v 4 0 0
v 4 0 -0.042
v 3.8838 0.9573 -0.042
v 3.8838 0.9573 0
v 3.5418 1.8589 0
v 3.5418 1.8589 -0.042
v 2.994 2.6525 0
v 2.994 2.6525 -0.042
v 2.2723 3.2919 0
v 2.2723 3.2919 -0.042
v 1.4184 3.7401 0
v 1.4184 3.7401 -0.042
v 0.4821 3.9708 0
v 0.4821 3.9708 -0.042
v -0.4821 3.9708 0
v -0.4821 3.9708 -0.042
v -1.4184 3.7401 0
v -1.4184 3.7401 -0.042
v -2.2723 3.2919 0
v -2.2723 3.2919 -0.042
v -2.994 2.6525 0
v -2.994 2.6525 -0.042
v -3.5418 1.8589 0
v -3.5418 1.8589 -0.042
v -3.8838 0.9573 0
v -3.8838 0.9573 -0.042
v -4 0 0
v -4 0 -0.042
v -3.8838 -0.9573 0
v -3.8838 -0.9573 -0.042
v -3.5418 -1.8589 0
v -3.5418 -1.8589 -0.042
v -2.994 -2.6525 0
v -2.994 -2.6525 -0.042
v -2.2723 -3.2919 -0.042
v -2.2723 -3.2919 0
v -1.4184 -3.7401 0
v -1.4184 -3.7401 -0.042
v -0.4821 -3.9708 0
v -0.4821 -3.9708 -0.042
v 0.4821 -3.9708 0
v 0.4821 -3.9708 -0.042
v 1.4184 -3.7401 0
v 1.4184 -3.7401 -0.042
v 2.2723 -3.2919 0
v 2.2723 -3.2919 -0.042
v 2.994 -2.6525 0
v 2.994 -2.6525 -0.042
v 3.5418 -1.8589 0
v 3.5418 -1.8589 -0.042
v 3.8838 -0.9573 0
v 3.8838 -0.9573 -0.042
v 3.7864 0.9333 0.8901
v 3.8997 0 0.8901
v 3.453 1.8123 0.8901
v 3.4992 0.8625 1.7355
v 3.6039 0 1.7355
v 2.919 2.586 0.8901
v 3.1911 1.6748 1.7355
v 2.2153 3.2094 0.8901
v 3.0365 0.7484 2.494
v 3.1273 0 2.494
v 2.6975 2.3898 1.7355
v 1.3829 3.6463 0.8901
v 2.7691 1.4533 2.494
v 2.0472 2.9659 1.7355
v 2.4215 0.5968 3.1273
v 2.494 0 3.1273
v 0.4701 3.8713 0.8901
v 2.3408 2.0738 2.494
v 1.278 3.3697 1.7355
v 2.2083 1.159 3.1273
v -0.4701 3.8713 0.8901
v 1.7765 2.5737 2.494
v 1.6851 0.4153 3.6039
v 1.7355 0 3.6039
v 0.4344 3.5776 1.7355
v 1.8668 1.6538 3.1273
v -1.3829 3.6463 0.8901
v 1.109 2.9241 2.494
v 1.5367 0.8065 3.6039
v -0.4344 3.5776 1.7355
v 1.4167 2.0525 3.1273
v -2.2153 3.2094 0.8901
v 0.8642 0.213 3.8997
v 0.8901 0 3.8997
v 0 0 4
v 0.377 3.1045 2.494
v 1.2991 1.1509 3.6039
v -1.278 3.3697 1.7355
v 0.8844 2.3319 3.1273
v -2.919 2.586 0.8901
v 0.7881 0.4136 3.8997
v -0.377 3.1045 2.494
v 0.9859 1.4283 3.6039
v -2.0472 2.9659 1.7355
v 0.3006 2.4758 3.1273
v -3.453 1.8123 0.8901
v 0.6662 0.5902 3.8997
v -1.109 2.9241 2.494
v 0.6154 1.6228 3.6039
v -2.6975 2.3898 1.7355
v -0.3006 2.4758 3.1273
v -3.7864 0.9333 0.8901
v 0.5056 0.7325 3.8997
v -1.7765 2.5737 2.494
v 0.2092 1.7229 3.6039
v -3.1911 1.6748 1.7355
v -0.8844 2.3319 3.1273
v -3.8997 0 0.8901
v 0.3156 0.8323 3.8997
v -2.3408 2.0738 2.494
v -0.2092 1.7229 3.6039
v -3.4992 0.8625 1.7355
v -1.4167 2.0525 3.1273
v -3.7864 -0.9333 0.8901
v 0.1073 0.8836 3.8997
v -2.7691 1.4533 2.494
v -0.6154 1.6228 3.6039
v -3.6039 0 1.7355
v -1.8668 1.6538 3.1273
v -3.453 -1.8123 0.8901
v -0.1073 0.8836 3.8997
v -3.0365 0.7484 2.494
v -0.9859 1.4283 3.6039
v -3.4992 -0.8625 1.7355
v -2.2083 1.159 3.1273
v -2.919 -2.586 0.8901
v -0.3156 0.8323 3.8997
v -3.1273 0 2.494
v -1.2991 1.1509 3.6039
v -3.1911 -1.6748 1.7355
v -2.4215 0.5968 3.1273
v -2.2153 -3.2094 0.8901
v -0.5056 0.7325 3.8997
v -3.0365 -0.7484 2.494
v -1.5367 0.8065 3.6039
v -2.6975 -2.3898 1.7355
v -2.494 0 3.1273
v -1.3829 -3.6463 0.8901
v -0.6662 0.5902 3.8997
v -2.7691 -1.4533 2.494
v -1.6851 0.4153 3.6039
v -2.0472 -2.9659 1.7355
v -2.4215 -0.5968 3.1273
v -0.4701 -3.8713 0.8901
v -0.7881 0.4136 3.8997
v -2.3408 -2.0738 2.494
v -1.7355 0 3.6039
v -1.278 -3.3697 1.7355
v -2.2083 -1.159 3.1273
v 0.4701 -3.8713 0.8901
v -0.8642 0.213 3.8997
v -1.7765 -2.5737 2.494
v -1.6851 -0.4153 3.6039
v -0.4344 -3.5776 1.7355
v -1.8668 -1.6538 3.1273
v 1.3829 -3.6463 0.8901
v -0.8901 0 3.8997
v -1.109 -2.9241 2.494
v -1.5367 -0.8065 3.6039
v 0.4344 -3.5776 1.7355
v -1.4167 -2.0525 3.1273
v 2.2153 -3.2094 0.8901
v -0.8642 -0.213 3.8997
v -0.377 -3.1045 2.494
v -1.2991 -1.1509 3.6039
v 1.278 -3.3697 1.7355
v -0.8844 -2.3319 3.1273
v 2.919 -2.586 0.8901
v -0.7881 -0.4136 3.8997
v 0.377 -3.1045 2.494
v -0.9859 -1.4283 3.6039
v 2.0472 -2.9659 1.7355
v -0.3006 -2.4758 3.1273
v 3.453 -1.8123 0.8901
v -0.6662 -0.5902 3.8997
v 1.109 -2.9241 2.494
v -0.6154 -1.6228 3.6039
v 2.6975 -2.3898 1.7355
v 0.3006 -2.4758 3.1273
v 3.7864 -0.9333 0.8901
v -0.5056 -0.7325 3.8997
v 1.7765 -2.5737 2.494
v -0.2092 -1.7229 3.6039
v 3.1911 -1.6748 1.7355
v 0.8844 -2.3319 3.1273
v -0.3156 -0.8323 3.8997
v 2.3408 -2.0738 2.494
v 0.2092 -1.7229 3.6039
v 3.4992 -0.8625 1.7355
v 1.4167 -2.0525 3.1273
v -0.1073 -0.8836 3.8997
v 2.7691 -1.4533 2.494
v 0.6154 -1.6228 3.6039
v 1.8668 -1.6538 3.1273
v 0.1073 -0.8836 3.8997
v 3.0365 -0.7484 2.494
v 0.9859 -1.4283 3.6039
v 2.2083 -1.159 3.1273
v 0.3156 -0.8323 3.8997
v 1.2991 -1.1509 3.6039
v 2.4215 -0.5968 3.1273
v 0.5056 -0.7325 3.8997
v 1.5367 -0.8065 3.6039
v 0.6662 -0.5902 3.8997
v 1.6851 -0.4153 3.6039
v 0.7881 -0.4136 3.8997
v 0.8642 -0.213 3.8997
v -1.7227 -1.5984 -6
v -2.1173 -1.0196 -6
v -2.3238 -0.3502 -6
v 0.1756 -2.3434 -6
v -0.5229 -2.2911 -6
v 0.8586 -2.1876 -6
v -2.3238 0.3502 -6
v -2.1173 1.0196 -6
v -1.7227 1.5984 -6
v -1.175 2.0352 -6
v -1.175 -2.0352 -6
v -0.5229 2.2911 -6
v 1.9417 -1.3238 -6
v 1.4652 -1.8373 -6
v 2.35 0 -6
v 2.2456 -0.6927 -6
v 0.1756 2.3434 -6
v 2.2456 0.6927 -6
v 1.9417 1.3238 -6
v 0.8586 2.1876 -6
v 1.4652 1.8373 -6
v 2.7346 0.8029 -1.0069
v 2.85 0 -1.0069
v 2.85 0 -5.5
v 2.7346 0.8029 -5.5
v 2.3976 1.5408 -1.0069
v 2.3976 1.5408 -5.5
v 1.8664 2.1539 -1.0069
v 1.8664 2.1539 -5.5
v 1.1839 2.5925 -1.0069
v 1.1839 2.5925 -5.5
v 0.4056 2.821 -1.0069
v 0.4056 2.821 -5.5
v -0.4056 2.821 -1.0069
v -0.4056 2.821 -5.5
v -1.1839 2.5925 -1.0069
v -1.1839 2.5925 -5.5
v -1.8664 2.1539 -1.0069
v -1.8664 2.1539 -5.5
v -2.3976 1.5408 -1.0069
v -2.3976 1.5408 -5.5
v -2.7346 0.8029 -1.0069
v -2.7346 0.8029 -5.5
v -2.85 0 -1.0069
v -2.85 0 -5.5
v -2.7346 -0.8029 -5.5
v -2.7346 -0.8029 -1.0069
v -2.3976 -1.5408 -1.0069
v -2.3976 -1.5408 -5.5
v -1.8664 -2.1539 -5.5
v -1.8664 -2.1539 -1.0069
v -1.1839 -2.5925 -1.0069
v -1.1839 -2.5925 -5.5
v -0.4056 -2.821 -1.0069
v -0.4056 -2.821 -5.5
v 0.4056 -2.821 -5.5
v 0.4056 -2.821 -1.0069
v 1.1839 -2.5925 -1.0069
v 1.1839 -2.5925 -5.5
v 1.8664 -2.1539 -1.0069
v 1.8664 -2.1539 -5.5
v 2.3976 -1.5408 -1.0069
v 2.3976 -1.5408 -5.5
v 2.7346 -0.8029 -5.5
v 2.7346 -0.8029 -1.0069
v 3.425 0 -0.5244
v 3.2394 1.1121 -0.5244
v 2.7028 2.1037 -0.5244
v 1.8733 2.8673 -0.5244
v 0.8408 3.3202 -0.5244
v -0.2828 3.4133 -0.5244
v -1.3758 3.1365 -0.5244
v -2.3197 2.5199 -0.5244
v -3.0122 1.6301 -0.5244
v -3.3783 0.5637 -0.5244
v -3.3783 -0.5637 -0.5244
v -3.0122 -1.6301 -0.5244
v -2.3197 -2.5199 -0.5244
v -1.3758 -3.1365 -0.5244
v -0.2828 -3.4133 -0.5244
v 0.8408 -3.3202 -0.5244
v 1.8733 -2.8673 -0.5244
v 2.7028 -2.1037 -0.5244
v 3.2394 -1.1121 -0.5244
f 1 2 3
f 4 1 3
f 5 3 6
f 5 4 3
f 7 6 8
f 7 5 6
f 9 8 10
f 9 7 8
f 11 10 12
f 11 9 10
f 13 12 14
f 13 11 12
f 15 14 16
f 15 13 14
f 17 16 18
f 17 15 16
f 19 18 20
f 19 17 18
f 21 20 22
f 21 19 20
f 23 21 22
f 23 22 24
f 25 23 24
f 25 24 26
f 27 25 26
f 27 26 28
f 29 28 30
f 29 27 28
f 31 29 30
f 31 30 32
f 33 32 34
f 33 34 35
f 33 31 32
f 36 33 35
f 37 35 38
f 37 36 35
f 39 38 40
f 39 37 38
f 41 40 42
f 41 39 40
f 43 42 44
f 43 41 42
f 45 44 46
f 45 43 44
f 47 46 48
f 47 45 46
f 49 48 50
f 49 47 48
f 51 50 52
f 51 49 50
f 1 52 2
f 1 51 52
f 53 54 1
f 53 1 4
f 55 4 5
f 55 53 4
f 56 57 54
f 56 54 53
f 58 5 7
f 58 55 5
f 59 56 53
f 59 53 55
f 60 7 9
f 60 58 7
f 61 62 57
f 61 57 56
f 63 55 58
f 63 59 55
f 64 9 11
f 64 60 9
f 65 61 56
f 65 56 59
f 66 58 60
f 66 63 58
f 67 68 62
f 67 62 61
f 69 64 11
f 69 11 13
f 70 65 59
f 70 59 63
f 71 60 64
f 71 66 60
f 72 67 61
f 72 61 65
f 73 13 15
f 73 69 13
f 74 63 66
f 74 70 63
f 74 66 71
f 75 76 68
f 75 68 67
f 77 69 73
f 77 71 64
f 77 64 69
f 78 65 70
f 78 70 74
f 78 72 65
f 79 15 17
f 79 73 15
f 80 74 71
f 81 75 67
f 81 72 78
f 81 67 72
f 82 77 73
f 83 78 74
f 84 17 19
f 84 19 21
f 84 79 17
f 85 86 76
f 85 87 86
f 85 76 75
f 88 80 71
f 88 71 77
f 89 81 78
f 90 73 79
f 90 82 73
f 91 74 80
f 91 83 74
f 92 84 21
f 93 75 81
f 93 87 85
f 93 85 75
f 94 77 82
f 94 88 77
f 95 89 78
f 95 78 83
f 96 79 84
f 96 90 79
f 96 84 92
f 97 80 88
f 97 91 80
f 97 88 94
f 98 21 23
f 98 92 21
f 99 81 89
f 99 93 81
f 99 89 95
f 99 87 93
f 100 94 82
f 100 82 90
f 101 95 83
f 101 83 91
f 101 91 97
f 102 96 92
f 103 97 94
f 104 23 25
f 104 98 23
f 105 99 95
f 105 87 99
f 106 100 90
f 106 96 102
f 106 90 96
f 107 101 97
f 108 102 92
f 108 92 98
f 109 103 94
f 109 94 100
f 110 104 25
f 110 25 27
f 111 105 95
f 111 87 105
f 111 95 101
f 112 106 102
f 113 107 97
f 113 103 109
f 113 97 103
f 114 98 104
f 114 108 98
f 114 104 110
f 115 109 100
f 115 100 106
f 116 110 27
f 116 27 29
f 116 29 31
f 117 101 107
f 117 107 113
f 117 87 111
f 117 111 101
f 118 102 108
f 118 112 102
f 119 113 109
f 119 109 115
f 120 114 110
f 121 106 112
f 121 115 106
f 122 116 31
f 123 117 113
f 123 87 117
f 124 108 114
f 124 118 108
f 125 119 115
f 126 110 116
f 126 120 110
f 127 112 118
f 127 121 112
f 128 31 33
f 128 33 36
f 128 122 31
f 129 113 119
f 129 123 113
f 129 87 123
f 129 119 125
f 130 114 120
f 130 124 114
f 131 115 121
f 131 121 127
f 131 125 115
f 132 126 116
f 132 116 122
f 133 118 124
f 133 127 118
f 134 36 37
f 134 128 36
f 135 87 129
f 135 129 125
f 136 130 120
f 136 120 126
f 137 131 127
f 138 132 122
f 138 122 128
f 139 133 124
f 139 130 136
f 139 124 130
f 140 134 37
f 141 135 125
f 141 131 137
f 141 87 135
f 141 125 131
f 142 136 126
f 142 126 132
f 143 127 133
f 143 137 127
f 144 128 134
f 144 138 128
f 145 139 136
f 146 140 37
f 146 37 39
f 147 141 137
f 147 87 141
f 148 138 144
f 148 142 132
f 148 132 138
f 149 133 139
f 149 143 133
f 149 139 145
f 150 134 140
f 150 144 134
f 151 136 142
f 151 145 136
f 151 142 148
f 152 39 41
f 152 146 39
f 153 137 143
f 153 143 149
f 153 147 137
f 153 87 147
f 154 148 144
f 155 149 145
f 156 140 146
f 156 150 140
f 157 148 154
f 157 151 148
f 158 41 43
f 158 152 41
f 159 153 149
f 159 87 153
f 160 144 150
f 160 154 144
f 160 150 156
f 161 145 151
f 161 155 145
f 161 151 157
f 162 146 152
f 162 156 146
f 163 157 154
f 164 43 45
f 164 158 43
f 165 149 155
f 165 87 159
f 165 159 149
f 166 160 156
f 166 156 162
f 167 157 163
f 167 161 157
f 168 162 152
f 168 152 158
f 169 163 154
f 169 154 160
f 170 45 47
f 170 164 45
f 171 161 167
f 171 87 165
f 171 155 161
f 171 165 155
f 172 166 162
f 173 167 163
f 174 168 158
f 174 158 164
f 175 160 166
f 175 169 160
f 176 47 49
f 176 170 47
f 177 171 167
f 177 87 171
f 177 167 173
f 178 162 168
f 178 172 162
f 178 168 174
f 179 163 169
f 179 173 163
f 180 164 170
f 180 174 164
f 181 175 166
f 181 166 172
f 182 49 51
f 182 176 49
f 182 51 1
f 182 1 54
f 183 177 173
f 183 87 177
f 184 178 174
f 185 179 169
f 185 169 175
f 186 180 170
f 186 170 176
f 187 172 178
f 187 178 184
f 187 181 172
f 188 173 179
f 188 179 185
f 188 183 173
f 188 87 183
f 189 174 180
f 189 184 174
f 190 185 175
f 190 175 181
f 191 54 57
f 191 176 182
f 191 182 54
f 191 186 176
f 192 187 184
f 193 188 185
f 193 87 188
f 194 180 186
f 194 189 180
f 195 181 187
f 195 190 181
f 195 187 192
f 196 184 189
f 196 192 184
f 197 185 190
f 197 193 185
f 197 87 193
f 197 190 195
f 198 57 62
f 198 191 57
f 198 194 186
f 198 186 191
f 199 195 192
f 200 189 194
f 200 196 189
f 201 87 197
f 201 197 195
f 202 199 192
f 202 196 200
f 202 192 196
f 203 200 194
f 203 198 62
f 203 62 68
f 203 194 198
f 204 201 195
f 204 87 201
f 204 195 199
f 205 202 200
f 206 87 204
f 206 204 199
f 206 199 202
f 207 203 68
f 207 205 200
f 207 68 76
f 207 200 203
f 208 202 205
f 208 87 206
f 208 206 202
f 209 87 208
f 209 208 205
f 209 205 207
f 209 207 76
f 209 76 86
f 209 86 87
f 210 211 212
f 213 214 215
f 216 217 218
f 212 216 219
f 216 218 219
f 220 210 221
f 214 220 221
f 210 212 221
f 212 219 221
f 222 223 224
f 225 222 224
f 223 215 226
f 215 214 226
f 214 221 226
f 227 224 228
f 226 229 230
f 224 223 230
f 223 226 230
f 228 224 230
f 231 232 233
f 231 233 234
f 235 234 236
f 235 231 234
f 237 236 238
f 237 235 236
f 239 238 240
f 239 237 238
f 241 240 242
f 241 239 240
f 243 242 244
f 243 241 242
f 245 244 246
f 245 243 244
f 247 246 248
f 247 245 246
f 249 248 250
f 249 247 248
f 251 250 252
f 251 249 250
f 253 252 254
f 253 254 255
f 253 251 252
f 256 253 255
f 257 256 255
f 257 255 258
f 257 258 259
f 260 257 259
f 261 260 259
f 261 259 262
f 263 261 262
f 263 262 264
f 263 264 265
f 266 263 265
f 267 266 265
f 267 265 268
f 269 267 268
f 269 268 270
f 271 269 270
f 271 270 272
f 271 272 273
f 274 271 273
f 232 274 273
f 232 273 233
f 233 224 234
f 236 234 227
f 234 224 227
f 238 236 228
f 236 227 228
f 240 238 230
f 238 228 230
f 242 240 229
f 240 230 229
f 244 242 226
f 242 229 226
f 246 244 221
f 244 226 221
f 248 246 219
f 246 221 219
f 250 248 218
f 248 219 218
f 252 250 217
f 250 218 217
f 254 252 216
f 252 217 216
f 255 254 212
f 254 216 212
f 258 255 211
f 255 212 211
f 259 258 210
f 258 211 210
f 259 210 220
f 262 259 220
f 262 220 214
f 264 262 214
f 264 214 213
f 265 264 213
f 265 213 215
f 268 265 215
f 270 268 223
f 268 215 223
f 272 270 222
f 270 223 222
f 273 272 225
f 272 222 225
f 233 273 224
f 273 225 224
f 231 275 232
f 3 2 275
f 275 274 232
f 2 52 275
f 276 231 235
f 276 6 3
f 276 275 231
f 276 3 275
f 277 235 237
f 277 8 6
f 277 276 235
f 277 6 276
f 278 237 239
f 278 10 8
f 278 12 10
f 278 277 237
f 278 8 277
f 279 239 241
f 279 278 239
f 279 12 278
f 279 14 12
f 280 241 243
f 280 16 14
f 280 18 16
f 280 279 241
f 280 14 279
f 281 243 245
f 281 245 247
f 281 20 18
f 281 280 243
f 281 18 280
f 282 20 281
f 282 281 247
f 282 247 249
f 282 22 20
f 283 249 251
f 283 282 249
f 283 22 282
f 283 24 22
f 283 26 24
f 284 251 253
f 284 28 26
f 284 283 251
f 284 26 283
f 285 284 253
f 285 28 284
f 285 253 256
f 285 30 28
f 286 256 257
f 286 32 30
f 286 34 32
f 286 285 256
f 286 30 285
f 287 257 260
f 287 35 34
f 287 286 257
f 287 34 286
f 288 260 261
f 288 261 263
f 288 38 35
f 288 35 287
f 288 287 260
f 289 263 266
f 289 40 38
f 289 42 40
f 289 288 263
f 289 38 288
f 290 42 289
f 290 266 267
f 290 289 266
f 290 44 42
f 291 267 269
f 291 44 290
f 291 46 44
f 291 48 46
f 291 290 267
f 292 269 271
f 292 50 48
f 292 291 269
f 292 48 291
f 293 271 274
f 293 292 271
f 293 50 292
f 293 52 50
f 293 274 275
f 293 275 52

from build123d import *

# Parameters (mm, degrees)
F0_R        = 4
F0_R_2      = 2.85
F1_DEPTH    = 4
F2_DEPTH    = 6
F3_R        = 3.99999
F4_SIZE     = 0.5
F5_S5_R     = 4
F5_T6_DEPTH = 7


# Not quite as in the source:
# - a fillet or chamfer that OpenCascade refuses, or shapes differently, is made with other operations: its cross-section is extruded or revolved along the edge and cut away or added
# - a fillet or chamfer is up to 0.001 mm smaller than in the source, because OpenCascade refuses the exact size


with BuildPart() as f1:
    # F0 (on Top) → F1 (new body)
    with BuildSketch(Plane.XY):
        Circle(F0_R)
        Circle(F0_R_2, mode=Mode.SUBTRACT)
        Circle(F0_R_2)
    extrude(amount=F1_DEPTH)

    # F0 (on Top) → F2 (join)
    with BuildSketch(Plane.XY):
        Circle(F0_R_2)
    extrude(amount=-F2_DEPTH)

    # F3 (radius 4 in the source; OpenCascade refuses exactly that, so slightly less here)
    f3_edges = [f1.edges().sort_by_distance(p)[0] for p in [
        (-4, 0, 4),
    ]]
    fillet(f3_edges, radius=F3_R)

    # F4
    f4_edges = [f1.edges().sort_by_distance(p)[0] for p in [
        (-2.85, 0, -6),
    ]]
    chamfer(f4_edges, length=F4_SIZE)

    # F5: chamfer of 1.2 x 1.0069195574 on 1 edges, made by hand


with BuildPart() as f5_tool2:
    # F5_s3 → F5_t4 (revolve)
    with BuildSketch(Plane.XZ):
        Polygon((2.85, -1.0069195574), (4.05, 0), (2.85, 0), align=None)
    revolve(axis=Axis((0, 0, 0), (0, 0, 1)))

    # F5_s5 → F5_t6 (intersect, symmetric)
    with BuildSketch(Plane.XY.offset(-0.5)):
        Circle(F5_S5_R)
    extrude(amount=F5_T6_DEPTH, both=True, mode=Mode.INTERSECT)


with BuildPart() as f1_1:
    add(f1.part)

    # F5_t1: union F5_tool2
    add(f5_tool2.part)


solid = f1_1.part
